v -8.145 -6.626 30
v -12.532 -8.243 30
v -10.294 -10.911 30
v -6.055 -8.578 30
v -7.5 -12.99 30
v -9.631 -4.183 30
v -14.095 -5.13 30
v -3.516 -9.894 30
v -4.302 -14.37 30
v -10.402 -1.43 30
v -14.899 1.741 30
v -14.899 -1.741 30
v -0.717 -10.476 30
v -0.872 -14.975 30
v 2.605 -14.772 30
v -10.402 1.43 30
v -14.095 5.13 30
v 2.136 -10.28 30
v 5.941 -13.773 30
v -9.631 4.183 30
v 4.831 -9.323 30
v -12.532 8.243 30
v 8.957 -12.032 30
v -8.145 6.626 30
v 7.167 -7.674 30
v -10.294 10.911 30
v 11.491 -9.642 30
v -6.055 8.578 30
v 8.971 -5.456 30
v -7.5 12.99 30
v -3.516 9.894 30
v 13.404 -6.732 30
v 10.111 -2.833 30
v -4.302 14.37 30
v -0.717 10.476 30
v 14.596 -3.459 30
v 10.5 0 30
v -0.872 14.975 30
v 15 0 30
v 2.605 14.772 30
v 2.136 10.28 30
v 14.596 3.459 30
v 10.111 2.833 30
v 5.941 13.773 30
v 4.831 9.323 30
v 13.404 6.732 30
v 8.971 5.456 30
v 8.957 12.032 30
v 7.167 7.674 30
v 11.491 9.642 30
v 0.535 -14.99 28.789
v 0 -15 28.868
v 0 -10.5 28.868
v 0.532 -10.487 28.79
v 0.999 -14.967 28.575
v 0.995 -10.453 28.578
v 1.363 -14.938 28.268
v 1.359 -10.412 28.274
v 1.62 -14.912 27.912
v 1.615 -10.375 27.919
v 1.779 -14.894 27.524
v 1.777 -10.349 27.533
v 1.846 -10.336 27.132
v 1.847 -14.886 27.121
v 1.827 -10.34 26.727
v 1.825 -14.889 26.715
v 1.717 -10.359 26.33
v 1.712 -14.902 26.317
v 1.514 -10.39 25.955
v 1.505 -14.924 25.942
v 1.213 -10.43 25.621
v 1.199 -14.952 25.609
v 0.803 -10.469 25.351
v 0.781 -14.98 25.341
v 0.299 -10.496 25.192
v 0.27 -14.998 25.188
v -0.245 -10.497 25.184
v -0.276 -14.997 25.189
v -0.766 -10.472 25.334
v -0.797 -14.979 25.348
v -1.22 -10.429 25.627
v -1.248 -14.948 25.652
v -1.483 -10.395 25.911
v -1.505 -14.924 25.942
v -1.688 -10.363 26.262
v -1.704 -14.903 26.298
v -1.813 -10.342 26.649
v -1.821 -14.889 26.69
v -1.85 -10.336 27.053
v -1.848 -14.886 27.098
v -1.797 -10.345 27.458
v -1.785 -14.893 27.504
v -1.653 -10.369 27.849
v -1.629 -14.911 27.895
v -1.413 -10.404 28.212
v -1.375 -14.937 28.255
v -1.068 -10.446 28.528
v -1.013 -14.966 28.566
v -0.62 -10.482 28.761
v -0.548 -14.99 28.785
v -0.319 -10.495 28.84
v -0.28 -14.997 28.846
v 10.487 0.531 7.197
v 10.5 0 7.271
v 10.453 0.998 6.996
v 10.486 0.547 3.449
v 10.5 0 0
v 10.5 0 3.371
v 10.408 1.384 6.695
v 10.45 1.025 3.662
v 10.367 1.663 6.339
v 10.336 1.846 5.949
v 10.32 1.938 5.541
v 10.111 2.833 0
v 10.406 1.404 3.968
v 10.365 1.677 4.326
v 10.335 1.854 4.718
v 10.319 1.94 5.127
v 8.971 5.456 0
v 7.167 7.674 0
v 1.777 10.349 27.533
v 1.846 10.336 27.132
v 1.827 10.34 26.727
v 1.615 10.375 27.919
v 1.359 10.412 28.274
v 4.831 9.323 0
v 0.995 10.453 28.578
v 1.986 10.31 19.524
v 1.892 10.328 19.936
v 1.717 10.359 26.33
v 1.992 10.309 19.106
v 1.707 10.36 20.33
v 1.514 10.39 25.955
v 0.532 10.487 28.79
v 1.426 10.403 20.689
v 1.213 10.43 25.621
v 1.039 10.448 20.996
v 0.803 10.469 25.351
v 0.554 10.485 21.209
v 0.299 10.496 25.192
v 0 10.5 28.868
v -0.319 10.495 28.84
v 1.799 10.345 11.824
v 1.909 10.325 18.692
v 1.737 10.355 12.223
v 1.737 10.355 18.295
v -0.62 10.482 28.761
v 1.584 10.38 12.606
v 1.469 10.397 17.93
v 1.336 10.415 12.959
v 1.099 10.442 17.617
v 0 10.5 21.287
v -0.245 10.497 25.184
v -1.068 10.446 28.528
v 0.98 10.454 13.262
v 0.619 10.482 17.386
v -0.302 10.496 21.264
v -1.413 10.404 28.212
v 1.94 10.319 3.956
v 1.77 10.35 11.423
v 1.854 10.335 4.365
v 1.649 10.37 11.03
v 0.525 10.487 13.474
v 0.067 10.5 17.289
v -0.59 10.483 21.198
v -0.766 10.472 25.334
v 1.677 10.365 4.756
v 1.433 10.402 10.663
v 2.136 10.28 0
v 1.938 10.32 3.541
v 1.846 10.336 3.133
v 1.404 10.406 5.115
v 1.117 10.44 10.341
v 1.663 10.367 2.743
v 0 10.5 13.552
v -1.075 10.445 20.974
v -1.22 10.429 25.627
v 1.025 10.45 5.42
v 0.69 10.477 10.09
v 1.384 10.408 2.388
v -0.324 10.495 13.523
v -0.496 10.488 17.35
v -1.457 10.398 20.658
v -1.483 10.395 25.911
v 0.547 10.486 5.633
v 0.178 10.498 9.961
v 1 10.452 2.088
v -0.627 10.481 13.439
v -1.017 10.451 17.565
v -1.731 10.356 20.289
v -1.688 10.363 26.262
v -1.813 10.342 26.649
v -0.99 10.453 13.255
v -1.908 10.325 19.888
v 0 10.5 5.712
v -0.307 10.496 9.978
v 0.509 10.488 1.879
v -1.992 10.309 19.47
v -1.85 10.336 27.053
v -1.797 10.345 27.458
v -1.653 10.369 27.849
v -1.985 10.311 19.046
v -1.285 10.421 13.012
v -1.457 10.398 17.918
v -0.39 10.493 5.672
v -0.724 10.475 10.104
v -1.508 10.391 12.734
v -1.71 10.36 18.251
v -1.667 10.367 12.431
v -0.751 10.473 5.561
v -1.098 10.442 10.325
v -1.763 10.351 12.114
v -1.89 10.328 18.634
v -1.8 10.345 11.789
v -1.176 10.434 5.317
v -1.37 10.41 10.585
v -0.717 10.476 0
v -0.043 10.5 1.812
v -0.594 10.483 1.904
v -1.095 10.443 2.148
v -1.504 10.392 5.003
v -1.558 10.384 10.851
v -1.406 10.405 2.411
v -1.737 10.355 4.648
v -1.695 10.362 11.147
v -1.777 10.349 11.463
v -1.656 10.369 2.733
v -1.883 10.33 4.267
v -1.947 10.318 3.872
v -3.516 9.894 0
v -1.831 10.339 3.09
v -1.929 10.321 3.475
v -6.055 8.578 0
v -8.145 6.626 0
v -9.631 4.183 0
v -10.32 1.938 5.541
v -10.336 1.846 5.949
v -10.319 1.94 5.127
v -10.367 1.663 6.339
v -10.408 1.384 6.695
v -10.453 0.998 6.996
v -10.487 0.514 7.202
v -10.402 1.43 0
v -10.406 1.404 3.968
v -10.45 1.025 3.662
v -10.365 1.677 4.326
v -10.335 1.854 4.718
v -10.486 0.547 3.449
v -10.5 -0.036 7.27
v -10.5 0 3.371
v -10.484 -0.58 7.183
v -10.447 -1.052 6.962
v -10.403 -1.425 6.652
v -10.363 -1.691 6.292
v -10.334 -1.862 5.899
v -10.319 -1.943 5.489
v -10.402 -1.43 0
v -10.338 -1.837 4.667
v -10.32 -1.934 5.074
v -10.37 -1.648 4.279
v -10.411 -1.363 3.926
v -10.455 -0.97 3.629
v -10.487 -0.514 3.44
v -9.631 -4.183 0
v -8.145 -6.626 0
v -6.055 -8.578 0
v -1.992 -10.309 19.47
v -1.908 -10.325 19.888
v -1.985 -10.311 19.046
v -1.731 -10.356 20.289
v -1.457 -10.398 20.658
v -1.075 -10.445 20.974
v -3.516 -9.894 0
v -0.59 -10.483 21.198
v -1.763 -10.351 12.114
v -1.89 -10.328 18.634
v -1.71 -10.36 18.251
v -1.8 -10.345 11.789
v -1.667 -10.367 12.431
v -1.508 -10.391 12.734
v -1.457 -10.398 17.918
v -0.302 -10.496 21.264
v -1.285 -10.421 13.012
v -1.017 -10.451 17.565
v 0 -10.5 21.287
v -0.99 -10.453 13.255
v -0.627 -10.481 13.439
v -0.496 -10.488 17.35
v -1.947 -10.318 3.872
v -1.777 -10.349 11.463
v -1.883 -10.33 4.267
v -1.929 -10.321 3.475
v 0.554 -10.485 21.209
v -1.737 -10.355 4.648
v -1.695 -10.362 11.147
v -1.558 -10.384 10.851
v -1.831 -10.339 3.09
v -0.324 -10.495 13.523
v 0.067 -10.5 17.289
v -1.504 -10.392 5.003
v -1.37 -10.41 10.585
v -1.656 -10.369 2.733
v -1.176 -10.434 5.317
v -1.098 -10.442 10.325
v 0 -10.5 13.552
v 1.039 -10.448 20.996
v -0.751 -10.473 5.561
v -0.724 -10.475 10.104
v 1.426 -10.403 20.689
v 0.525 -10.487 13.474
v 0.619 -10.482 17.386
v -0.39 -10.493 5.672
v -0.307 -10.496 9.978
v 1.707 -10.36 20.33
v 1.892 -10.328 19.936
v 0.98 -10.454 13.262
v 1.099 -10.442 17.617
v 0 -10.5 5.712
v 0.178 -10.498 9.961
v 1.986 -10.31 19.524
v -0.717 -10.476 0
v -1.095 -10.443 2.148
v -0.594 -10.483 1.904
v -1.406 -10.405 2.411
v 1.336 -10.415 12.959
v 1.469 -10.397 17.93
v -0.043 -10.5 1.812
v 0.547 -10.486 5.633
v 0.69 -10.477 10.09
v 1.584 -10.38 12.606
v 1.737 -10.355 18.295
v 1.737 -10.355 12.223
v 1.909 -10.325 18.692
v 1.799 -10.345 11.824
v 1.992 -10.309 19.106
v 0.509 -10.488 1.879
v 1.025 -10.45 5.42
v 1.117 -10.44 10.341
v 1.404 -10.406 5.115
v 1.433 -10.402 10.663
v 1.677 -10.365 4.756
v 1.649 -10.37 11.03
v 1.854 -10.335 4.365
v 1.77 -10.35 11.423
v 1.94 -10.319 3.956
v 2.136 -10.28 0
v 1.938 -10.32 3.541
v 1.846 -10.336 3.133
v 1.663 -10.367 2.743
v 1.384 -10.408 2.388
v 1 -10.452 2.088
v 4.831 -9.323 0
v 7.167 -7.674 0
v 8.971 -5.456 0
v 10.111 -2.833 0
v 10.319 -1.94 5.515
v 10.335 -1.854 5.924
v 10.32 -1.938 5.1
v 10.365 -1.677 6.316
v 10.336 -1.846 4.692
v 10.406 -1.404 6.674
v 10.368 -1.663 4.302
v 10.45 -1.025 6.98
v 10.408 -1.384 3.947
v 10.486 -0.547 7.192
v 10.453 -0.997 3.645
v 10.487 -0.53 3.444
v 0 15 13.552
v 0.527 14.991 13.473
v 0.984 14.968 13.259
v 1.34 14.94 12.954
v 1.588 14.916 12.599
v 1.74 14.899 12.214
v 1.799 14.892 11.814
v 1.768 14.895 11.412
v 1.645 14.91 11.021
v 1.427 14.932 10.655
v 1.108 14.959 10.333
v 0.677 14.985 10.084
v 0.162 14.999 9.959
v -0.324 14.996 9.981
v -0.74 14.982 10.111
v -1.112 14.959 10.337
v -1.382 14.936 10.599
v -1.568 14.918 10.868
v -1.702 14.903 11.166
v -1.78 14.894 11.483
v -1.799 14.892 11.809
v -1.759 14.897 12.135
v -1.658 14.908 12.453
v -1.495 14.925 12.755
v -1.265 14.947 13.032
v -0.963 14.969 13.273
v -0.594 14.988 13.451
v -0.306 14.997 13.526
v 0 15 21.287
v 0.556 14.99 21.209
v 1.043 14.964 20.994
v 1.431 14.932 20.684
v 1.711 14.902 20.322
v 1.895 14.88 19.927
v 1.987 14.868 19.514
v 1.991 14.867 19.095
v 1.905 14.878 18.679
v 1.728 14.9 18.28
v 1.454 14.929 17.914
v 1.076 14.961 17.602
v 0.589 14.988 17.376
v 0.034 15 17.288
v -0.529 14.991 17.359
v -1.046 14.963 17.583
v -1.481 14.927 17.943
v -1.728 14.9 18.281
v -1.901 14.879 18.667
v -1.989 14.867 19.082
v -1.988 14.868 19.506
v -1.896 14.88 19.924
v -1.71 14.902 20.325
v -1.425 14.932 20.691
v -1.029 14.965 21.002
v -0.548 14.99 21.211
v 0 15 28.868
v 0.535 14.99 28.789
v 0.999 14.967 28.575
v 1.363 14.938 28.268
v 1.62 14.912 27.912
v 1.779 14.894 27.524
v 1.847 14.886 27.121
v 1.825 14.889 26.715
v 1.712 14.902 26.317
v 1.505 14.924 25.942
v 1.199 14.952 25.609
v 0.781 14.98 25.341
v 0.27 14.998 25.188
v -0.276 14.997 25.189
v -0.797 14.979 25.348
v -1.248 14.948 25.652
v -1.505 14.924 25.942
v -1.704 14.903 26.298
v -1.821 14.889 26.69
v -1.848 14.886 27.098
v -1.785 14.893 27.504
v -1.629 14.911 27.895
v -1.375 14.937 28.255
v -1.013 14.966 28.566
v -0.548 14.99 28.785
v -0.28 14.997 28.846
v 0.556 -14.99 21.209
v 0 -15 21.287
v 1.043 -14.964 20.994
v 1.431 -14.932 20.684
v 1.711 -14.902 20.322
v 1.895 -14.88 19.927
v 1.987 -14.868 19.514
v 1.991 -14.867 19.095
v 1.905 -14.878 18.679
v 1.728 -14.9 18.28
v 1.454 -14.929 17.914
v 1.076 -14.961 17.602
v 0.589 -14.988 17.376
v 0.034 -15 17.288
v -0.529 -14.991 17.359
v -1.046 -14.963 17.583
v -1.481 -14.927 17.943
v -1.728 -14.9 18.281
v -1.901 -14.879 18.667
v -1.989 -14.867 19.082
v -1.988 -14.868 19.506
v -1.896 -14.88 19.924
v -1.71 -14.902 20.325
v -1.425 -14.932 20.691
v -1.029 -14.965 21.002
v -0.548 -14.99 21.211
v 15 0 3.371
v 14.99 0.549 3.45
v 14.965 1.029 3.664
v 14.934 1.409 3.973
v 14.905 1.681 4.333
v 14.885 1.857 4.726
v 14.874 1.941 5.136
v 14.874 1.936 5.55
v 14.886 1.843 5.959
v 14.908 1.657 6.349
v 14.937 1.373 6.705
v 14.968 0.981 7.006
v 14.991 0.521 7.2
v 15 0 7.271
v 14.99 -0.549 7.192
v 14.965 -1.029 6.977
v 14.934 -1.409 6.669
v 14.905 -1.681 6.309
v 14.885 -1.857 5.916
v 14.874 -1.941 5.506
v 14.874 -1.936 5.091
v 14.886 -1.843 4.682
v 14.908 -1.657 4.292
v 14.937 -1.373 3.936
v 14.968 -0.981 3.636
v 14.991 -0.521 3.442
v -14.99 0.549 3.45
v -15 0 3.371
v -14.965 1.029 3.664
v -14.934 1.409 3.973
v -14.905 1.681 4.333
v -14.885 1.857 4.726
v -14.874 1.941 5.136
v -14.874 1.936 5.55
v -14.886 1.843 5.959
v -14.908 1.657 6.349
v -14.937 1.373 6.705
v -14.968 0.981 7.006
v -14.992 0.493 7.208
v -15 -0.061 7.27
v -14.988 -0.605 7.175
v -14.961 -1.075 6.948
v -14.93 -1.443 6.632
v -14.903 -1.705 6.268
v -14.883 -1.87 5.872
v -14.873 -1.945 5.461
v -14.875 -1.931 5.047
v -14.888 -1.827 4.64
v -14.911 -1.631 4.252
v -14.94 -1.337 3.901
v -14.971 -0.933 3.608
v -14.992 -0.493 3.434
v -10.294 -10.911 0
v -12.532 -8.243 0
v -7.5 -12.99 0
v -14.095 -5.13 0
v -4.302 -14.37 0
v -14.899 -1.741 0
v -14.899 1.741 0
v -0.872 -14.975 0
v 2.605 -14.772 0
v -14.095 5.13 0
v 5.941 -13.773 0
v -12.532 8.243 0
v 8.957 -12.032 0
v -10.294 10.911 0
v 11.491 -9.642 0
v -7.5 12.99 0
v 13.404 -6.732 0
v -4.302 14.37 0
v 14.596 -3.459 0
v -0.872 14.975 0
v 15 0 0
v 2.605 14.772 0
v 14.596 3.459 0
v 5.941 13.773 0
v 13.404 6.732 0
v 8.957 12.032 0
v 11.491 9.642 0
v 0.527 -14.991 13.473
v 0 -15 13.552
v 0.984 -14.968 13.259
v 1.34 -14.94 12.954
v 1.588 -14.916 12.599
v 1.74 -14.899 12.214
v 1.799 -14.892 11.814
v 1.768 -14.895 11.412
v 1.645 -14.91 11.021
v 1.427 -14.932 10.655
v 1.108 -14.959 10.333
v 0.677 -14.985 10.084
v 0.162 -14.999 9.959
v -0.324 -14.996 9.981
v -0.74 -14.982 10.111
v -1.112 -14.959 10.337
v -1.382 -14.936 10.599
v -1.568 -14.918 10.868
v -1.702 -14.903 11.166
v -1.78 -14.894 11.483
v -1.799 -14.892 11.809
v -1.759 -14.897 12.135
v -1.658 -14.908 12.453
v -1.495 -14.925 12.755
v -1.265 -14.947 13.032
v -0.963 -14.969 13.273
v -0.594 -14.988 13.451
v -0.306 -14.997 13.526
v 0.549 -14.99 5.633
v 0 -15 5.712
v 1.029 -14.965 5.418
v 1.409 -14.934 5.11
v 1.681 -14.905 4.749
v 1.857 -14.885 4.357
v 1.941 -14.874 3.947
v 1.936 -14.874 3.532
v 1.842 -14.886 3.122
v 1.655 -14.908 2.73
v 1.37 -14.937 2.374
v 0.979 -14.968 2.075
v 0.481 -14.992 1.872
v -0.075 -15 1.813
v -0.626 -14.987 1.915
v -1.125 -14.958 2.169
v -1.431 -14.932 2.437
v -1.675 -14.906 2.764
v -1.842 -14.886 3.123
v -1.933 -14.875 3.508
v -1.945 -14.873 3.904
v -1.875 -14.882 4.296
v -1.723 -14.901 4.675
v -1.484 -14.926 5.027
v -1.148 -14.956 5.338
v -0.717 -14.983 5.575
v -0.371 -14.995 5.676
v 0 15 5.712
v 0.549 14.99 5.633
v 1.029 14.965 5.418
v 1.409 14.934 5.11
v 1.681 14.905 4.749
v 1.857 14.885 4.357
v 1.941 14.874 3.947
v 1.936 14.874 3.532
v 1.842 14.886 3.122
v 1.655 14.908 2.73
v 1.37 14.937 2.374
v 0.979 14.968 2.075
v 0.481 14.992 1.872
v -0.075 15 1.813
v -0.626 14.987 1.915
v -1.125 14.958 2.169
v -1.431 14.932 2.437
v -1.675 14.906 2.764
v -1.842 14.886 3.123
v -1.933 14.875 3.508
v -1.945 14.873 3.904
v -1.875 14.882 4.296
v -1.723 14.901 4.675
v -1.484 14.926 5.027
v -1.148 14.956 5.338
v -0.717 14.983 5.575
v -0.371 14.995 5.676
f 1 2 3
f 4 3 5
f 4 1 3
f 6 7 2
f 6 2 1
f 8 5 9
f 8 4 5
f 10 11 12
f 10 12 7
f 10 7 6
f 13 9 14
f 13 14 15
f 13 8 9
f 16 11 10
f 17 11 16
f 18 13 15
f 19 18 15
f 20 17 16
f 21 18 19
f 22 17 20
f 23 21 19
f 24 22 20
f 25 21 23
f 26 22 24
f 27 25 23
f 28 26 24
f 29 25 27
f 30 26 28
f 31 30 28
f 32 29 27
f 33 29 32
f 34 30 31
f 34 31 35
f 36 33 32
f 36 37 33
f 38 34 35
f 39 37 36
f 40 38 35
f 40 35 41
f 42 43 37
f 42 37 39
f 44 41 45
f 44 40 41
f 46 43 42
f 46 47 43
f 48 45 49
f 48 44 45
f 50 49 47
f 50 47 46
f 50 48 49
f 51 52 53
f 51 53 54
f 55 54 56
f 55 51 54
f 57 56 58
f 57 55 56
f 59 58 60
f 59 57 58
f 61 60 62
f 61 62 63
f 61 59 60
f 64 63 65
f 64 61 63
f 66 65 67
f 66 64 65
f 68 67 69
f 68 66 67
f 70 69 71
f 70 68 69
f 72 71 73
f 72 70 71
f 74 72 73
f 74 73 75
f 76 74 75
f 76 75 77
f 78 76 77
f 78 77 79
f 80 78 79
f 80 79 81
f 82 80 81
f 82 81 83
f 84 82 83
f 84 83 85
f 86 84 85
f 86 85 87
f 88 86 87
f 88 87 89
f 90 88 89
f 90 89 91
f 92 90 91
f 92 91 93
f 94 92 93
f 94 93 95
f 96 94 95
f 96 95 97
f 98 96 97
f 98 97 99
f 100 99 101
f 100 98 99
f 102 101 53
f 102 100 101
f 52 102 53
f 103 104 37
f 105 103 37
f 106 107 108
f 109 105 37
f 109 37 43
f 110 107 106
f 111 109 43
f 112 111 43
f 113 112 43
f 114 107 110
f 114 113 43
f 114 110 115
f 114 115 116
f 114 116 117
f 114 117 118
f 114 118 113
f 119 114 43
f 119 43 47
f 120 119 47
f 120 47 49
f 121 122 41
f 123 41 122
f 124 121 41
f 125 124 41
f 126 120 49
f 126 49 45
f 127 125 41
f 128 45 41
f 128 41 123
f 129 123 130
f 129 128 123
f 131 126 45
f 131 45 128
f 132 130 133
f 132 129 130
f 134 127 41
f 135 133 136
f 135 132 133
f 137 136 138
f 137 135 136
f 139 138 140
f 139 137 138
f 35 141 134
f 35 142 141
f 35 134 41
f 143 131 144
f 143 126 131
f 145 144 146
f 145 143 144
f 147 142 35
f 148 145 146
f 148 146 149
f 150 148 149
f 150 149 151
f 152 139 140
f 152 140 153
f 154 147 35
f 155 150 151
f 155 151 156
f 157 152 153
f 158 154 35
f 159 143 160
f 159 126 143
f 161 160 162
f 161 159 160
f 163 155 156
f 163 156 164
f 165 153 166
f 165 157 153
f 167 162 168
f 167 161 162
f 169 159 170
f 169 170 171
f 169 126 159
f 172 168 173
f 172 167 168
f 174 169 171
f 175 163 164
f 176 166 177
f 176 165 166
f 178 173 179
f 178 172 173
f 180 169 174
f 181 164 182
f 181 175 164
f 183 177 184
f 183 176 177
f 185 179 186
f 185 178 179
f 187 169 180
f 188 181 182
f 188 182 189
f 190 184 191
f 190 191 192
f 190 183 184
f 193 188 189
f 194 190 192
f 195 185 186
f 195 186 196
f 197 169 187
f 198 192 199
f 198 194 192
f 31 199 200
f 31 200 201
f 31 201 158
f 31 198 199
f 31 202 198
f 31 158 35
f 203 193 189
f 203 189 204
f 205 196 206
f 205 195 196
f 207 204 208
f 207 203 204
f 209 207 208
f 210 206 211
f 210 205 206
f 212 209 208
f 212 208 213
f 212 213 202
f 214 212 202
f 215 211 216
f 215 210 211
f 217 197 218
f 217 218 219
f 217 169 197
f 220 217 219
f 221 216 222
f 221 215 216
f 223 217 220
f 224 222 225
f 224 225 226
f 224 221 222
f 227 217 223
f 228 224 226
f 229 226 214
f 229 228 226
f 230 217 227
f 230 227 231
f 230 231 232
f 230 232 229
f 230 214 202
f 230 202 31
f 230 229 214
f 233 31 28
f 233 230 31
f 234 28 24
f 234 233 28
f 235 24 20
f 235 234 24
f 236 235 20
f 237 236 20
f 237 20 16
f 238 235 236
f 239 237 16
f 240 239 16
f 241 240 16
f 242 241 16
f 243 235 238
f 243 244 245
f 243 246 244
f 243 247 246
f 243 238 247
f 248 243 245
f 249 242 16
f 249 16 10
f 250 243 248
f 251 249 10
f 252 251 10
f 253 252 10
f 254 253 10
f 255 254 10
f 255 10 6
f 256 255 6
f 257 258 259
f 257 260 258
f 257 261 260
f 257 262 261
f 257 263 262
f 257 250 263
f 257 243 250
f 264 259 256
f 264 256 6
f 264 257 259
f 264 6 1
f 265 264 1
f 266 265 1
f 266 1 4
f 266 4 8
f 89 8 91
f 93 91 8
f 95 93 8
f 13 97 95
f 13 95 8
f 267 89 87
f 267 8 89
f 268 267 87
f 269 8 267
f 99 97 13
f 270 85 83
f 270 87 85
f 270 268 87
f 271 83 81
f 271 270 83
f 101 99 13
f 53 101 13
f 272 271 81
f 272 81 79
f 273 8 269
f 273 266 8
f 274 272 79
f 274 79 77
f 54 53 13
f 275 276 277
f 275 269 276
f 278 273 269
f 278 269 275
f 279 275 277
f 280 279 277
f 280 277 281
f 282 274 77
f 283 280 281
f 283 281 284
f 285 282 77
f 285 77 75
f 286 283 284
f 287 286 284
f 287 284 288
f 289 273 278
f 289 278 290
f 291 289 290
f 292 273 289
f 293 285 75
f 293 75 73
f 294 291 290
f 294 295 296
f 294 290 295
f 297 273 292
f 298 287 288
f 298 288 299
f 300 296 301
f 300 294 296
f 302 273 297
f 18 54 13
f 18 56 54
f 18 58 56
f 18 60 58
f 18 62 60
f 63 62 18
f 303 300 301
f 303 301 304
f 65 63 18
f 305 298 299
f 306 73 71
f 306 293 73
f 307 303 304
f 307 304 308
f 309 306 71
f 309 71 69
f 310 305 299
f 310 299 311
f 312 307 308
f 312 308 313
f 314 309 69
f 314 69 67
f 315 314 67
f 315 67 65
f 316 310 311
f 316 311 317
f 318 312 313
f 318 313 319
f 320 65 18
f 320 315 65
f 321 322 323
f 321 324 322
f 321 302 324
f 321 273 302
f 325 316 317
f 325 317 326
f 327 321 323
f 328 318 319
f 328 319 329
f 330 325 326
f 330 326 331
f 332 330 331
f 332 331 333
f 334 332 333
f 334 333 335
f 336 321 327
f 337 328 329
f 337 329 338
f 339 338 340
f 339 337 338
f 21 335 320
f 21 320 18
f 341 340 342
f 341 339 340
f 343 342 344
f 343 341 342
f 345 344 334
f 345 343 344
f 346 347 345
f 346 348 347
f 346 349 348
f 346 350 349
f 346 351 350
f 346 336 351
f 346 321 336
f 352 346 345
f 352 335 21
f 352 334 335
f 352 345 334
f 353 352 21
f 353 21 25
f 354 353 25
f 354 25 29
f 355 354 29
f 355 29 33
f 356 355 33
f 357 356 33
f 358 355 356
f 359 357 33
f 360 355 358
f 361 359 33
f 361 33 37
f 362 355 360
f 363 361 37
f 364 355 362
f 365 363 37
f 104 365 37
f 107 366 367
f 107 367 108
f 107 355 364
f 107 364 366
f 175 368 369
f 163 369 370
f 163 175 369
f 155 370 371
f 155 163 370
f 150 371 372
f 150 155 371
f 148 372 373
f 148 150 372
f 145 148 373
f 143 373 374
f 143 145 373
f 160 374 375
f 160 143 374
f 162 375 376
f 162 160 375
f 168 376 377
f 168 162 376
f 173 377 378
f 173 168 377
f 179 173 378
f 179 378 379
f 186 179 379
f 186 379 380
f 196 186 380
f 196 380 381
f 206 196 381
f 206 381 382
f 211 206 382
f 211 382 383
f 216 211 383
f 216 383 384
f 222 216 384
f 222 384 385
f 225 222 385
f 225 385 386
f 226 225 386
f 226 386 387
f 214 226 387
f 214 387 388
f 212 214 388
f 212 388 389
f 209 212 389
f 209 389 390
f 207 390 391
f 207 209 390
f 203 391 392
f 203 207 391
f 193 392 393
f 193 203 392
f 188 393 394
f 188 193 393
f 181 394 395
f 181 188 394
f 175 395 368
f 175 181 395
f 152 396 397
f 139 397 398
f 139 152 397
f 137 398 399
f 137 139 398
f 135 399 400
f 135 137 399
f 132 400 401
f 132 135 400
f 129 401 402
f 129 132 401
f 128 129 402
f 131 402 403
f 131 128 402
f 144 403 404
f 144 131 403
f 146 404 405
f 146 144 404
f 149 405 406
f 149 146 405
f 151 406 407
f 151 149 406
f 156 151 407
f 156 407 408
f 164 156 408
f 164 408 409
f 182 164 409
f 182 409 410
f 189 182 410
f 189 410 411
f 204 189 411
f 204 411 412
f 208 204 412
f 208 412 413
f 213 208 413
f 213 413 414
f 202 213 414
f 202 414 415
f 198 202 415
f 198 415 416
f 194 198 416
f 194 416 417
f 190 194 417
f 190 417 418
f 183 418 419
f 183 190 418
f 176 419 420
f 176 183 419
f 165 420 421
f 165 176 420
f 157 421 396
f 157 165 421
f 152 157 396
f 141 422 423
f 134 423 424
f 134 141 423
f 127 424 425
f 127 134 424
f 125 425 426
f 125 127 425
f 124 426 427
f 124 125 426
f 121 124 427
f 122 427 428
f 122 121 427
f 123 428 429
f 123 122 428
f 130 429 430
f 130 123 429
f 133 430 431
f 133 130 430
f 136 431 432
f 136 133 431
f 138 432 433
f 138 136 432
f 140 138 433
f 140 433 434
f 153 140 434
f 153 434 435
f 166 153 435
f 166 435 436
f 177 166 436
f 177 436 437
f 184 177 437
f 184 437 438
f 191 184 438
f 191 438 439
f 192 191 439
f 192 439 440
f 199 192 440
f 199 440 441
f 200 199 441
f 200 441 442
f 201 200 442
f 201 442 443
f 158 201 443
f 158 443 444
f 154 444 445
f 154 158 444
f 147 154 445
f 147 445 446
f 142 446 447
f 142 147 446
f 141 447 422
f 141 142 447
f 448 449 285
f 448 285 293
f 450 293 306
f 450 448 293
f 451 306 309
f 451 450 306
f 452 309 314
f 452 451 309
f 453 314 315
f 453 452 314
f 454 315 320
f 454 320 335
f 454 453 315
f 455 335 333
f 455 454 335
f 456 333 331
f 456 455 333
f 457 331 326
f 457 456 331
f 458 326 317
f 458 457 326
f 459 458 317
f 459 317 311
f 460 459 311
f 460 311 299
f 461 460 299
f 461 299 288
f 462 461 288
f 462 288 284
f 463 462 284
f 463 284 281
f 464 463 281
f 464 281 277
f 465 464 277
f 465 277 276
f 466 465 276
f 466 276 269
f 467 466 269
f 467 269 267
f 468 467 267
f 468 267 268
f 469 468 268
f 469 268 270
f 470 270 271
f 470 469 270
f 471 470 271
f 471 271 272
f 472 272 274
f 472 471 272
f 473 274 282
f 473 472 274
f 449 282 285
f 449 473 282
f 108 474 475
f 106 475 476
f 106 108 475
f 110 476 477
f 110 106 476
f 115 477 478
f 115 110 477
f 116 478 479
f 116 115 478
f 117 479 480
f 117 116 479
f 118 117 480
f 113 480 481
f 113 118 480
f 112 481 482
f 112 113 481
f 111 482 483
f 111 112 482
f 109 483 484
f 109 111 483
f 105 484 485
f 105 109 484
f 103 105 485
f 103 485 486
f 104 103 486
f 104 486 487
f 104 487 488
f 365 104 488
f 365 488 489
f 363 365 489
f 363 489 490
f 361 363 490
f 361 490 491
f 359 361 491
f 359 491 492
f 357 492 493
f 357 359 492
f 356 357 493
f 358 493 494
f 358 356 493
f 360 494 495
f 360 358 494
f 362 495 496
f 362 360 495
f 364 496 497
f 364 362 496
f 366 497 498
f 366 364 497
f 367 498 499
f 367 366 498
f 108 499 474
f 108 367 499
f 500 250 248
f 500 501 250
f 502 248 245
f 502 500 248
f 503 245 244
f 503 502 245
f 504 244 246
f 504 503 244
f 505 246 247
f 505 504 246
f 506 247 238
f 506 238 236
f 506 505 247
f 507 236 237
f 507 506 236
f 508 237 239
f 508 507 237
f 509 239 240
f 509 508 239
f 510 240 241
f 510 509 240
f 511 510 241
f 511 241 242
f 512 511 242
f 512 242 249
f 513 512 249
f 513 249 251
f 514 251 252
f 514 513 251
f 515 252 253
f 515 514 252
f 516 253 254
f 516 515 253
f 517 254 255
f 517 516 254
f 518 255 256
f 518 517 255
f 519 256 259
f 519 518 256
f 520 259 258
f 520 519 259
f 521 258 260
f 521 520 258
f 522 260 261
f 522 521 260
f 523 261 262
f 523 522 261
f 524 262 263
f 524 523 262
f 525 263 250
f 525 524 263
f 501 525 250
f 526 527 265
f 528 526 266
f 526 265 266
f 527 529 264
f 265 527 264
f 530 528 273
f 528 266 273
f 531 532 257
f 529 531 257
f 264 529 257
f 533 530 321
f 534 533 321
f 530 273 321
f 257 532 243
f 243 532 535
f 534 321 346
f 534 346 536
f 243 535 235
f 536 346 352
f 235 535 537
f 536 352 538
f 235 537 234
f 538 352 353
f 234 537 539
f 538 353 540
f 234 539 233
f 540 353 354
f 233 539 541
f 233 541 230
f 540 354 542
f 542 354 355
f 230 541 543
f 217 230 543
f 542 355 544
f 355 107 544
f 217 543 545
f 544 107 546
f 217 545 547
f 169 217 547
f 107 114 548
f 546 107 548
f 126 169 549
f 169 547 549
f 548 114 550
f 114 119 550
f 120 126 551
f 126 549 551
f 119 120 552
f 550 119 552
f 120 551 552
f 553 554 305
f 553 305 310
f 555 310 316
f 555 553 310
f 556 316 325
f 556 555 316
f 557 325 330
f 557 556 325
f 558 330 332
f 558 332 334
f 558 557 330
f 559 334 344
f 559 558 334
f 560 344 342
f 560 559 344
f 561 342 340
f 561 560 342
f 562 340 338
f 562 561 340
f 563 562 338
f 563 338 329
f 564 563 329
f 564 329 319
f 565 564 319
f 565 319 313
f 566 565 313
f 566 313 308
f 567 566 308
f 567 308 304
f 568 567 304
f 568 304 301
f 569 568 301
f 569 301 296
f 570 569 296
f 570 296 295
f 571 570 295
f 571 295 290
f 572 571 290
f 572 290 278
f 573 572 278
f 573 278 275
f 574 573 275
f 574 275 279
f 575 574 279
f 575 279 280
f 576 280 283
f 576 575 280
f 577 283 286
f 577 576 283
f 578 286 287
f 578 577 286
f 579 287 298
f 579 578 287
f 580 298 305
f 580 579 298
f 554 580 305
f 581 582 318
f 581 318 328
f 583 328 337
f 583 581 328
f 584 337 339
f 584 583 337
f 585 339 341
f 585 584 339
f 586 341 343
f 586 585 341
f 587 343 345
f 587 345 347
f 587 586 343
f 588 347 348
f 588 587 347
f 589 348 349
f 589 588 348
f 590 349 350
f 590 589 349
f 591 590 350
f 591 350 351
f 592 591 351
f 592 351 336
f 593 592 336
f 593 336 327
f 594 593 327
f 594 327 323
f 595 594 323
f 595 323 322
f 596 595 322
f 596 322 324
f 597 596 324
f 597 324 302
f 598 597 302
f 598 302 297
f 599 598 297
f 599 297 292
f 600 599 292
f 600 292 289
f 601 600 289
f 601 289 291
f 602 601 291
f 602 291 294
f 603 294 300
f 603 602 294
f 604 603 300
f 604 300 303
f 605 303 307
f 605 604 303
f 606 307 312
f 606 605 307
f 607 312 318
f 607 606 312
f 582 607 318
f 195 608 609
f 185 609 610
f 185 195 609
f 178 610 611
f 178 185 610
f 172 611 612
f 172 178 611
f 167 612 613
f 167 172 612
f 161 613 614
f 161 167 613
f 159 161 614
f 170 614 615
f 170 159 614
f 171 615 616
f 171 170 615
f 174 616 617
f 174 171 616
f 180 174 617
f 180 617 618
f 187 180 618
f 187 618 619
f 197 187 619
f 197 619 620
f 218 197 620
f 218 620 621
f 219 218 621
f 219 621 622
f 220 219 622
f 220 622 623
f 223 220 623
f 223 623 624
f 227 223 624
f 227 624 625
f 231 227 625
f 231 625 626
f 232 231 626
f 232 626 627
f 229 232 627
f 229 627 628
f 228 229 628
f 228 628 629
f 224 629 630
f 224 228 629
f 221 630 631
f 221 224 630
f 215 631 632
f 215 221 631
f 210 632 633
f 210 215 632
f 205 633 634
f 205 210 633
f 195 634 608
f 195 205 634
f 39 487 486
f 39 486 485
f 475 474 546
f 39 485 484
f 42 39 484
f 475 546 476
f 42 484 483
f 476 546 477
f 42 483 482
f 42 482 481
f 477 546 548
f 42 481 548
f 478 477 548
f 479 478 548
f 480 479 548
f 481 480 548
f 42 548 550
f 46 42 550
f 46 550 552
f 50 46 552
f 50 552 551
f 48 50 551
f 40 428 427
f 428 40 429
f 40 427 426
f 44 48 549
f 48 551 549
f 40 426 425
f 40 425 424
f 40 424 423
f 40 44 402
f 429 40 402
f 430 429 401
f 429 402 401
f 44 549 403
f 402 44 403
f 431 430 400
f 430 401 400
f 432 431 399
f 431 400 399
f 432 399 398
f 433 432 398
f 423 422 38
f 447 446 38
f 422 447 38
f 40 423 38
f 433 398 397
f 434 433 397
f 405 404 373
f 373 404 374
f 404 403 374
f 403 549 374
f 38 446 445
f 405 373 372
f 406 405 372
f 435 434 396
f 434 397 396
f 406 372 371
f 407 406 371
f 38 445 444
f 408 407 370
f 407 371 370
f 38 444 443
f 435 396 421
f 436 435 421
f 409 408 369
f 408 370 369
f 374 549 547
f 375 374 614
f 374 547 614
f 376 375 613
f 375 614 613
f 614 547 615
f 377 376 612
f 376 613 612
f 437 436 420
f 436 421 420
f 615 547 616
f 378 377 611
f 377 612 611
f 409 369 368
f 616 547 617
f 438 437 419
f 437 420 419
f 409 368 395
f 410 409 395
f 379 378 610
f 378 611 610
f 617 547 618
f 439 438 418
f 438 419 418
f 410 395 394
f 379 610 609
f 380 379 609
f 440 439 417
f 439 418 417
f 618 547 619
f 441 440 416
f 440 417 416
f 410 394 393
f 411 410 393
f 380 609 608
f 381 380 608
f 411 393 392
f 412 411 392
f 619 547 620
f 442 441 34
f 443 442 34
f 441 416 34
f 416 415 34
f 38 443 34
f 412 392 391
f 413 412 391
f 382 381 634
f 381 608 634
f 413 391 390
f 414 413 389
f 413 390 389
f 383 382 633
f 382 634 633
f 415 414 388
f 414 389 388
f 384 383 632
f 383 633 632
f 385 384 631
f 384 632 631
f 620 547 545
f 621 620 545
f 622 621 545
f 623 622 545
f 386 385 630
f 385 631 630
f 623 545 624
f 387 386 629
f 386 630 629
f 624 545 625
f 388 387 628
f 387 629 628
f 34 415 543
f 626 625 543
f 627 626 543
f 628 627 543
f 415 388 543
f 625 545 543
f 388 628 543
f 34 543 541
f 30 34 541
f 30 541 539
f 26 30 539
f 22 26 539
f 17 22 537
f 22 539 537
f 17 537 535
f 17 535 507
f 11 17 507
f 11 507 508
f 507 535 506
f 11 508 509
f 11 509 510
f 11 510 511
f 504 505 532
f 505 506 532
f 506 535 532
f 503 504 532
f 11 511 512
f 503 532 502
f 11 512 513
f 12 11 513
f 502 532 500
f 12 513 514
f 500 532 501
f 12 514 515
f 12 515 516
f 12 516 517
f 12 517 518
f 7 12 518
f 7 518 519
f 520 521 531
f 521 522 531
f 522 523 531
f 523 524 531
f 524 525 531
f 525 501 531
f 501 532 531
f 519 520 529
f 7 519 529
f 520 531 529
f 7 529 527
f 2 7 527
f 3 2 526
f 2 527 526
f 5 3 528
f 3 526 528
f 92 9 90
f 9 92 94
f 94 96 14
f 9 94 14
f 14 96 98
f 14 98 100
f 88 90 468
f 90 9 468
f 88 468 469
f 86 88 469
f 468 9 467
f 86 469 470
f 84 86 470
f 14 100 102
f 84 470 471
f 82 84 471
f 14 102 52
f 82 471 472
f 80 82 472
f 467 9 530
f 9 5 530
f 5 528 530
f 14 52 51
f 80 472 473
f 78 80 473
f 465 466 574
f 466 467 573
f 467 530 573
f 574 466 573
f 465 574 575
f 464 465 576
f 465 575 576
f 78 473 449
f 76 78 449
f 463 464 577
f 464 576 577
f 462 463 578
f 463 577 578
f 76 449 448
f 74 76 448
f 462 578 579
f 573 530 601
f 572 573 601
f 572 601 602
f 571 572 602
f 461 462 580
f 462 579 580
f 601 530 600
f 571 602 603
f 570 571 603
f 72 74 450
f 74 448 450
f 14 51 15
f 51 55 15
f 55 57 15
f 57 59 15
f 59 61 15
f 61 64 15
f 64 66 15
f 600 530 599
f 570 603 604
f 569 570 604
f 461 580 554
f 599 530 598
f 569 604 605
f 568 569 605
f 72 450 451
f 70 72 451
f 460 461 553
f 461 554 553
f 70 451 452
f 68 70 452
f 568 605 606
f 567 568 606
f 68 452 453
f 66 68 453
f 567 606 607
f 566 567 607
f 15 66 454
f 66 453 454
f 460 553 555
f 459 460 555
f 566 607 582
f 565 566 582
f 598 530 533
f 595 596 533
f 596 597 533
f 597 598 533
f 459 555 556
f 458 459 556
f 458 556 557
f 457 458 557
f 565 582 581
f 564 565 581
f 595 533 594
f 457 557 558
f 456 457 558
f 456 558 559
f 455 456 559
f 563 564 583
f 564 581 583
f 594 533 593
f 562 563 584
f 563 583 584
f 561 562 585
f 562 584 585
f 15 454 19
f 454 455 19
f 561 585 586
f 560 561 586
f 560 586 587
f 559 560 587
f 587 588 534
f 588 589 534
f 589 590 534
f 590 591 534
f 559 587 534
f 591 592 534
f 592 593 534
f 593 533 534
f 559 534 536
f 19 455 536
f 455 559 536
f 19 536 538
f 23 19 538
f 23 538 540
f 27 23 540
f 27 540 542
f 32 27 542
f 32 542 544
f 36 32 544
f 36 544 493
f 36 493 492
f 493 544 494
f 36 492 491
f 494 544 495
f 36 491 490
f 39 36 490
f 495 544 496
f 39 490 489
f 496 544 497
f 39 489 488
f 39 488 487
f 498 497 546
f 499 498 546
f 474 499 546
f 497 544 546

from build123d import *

# Parameters (mm, degrees)
ESQUISSE1_R                  = 15
ESQUISSE1_R_2                = 10.5
BOSS_EXTRU_1_DEPTH           = 30
ENL_V_MAT_EXTRU_1_DEPTH      = 37.742346142
ENL_V_MAT_EXTRU_1_DEPTH_BACK = 37.742346142
ESQUISSE2_R                  = 1.95
ENL_V_MAT_EXTRU_2_DEPTH      = 37.742346305
ENL_V_MAT_EXTRU_2_DEPTH_BACK = 37.742346305
ESQUISSE3_R                  = 1.8
ENL_V_MAT_EXTRU_3_DEPTH      = 37.742346305
ENL_V_MAT_EXTRU_3_DEPTH_BACK = 37.742346305
ESQUISSE4_R                  = 2
ENL_V_MAT_EXTRU_4_DEPTH      = 37.742346305
ENL_V_MAT_EXTRU_4_DEPTH_BACK = 37.742346305
ESQUISSE5_R                  = 1.85
ENL_V_MAT_EXTRU_5_DEPTH      = 37.742346305
ENL_V_MAT_EXTRU_5_DEPTH_BACK = 37.742346305
ESQUISSE6_R                  = 1.95


with BuildPart() as part:
    # Esquisse1 → Boss.-Extru.1 (new body)
    with BuildSketch(Plane.XY):
        Circle(ESQUISSE1_R)
        Circle(ESQUISSE1_R_2, mode=Mode.SUBTRACT)
    extrude(amount=BOSS_EXTRU_1_DEPTH)

    # Esquisse2 → Enlèv. mat.-Extru.1 (cut, two sides: drawn at the far end of the back side and taken through both)
    with BuildSketch(Plane(origin=(0, 0, 0), x_dir=(1, 0, 0), z_dir=(0, 1, 0)).offset(-ENL_V_MAT_EXTRU_1_DEPTH_BACK)):
        with Locations(Location((0, -3.761693036, 0), (0, 0, 270))):
            Circle(ESQUISSE2_R)
    extrude(amount=ENL_V_MAT_EXTRU_1_DEPTH + ENL_V_MAT_EXTRU_1_DEPTH_BACK, mode=Mode.SUBTRACT)

    # Esquisse3 → Enlèv. mat.-Extru.2 (cut, two sides: drawn at the far end of the back side and taken through both)
    with BuildSketch(Plane(origin=(0, 0, 0), x_dir=(1, 0, 0), z_dir=(0, 1, 0)).offset(-ENL_V_MAT_EXTRU_2_DEPTH_BACK)):
        with Locations(Location((0, -11.751934404, 0), (0, 0, 270))):
            Circle(ESQUISSE3_R)
    extrude(amount=ENL_V_MAT_EXTRU_2_DEPTH + ENL_V_MAT_EXTRU_2_DEPTH_BACK, mode=Mode.SUBTRACT)

    # Esquisse4 → Enlèv. mat.-Extru.3 (cut, two sides: drawn at the far end of the back side and taken through both)
    with BuildSketch(Plane(origin=(0, 0, 0), x_dir=(1, 0, 0), z_dir=(0, 1, 0)).offset(-ENL_V_MAT_EXTRU_3_DEPTH_BACK)):
        with Locations(Location((0, -19.287446587, 0), (0, 0, 270))):
            Circle(ESQUISSE4_R)
    extrude(amount=ENL_V_MAT_EXTRU_3_DEPTH + ENL_V_MAT_EXTRU_3_DEPTH_BACK, mode=Mode.SUBTRACT)

    # Esquisse5 → Enlèv. mat.-Extru.4 (cut, two sides: drawn at the far end of the back side and taken through both)
    with BuildSketch(Plane(origin=(0, 0, 0), x_dir=(1, 0, 0), z_dir=(0, 1, 0)).offset(-ENL_V_MAT_EXTRU_4_DEPTH_BACK)):
        with Locations(Location((0, -27.017842707, 0), (0, 0, 270))):
            Circle(ESQUISSE5_R)
    extrude(amount=ENL_V_MAT_EXTRU_4_DEPTH + ENL_V_MAT_EXTRU_4_DEPTH_BACK, mode=Mode.SUBTRACT)

    # Esquisse6 → Enlèv. mat.-Extru.5 (cut, two sides: drawn at the far end of the back side and taken through both)
    with BuildSketch(Plane(origin=(0, 0, 0), x_dir=(0, 0, -1), z_dir=(1, 0, 0)).offset(-ENL_V_MAT_EXTRU_5_DEPTH_BACK)):
        with Locations((-5.320764522, 0)):
            Circle(ESQUISSE6_R)
    extrude(amount=ENL_V_MAT_EXTRU_5_DEPTH + ENL_V_MAT_EXTRU_5_DEPTH_BACK, mode=Mode.SUBTRACT)


solid = part.part
